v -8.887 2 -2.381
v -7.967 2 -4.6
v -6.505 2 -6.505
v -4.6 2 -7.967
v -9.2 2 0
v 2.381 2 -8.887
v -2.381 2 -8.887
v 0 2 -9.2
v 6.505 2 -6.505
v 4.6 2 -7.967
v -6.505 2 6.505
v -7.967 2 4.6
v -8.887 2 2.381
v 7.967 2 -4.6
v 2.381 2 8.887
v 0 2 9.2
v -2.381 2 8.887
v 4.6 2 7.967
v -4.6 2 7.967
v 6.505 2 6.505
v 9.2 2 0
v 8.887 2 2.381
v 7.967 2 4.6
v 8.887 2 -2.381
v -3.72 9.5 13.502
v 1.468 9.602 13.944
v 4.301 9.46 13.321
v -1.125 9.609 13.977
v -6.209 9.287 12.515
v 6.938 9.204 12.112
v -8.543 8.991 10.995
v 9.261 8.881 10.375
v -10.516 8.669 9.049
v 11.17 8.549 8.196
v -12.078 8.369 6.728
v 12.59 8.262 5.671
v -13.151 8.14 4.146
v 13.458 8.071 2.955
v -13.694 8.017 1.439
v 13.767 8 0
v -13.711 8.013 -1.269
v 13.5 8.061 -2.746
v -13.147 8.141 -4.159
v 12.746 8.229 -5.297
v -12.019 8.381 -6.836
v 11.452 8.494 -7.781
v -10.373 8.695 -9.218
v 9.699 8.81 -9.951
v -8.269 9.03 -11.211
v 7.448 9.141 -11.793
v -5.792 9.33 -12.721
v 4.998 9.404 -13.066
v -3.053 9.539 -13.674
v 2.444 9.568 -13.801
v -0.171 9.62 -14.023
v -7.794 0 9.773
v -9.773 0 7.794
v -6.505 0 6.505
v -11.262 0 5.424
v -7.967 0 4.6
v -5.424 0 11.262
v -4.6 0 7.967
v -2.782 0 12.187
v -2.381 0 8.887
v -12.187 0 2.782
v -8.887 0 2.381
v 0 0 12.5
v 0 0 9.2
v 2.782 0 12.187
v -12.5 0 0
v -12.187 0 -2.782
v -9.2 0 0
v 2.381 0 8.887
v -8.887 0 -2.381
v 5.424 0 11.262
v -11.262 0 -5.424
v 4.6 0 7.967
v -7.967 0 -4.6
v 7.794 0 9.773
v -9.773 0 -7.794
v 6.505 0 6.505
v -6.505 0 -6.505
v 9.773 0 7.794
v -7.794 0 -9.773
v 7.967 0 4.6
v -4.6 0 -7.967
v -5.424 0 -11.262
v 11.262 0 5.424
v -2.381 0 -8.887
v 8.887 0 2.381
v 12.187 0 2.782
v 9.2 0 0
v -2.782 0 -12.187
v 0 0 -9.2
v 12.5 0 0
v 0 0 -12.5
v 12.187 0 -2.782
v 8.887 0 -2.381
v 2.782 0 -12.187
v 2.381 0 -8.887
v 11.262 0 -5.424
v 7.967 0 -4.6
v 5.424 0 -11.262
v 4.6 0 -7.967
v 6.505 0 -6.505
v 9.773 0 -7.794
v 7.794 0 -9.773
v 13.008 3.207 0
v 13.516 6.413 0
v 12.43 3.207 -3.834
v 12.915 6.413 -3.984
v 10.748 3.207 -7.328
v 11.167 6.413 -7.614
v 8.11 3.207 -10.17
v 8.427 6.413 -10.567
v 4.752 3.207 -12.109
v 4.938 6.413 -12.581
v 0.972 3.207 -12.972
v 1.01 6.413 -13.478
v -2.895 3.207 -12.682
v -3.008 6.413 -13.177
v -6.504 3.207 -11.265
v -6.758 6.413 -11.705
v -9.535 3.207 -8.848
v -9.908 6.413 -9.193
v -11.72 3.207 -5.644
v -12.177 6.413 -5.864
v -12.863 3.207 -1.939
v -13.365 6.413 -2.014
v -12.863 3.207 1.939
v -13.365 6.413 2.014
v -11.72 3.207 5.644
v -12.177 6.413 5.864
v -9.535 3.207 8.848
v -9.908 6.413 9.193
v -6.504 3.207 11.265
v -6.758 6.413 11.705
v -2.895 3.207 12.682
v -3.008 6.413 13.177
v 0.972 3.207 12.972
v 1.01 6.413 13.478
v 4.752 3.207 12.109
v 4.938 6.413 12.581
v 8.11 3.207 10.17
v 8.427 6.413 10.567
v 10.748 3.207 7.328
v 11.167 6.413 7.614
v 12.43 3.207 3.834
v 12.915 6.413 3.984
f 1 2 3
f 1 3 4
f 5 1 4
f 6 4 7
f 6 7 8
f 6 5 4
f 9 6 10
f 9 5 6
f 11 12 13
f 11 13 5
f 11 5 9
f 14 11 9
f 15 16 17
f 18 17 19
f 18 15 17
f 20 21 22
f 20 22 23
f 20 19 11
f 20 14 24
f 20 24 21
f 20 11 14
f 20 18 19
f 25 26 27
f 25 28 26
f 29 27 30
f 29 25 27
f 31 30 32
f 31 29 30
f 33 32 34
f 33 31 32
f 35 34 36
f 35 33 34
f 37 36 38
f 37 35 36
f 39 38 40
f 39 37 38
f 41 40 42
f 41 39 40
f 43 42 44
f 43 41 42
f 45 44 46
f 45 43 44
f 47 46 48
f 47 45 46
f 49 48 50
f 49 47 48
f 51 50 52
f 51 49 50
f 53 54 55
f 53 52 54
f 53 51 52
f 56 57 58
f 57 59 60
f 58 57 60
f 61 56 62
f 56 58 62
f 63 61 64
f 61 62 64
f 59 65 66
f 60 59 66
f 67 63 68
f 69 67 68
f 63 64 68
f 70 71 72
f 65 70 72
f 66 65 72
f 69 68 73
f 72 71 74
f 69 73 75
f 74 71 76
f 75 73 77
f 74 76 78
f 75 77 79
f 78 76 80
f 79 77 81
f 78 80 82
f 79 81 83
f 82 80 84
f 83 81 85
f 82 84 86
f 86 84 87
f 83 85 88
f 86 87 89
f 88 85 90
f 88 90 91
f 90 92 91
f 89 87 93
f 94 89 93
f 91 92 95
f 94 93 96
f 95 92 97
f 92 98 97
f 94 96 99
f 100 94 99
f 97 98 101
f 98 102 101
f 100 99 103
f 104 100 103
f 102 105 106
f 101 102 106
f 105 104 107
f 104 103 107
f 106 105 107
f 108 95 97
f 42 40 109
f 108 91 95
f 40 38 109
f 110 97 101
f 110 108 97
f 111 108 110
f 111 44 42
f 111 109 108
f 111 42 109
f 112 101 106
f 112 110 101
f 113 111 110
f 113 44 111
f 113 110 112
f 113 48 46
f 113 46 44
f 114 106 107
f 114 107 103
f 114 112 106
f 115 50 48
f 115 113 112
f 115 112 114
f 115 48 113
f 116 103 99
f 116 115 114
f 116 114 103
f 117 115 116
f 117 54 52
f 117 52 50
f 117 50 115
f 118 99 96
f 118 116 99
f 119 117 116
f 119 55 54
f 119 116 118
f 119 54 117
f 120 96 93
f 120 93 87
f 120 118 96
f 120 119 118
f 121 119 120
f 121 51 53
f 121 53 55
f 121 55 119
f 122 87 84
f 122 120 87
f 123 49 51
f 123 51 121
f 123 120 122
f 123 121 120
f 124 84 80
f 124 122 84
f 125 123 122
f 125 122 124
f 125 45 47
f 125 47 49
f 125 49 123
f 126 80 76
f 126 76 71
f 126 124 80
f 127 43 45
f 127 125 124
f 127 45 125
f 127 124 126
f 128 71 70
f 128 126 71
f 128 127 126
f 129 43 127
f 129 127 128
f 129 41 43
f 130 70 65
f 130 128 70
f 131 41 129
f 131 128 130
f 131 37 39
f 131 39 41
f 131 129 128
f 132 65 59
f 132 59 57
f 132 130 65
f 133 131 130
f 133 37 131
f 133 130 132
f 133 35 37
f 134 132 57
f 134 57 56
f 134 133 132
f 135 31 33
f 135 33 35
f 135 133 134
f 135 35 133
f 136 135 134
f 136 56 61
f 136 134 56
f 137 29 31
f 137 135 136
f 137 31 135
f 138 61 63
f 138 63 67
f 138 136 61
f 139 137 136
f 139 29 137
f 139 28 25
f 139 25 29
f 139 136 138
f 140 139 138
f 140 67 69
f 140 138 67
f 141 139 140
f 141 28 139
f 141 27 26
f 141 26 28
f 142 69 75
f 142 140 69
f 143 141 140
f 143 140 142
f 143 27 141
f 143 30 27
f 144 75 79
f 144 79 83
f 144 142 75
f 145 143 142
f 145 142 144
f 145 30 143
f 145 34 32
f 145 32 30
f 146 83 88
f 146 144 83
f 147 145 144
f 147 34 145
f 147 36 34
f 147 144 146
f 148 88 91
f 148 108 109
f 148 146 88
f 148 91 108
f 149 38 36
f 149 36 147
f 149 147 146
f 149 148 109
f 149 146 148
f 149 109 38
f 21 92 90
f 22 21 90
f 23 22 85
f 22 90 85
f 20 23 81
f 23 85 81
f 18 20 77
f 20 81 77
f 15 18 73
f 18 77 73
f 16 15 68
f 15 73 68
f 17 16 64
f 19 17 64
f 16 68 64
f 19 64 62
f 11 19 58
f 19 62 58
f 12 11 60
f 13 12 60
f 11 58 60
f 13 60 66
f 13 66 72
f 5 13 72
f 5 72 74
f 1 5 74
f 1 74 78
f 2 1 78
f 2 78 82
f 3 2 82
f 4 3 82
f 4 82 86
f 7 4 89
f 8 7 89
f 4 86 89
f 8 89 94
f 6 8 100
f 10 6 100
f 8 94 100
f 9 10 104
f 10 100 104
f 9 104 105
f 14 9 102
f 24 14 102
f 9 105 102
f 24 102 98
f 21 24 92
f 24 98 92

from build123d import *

# Parameters (mm, degrees)
SKETCH1_R               = 12.5
BOSS_EXTRUDE1_DEPTH     = 10
BOSS_EXTRUDE1_TAPER     = -9
SKETCH2_R               = 9.2
CUT_EXTRUDE1_DEPTH      = 2
SKETCH3_R               = 61.5
CUT_EXTRUDE2_DEPTH      = 15.083844503
CUT_EXTRUDE2_DEPTH_BACK = 15.083844503


with BuildPart() as part:
    # Sketch1 → Boss-Extrude1 (new body)
    with BuildSketch(Plane(origin=(0, 0, 0), x_dir=(1, 0, 0), z_dir=(0, 1, 0))):
        Circle(SKETCH1_R)
    extrude(amount=BOSS_EXTRUDE1_DEPTH, taper=BOSS_EXTRUDE1_TAPER)

    # Sketch2 → Cut-Extrude1 (cut)
    with BuildSketch(Plane.XZ):
        Circle(SKETCH2_R)
    extrude(amount=-CUT_EXTRUDE1_DEPTH, mode=Mode.SUBTRACT)

    # Sketch3 → Cut-Extrude2 (cut, two sides)
    with BuildSketch(Plane(origin=(0, 0, 0), x_dir=(0, 0, -1), z_dir=(1, 0, 0))) as cut_extrude2_sk:
        with Locations((0, 69.5)):
            Circle(SKETCH3_R)
    extrude(amount=CUT_EXTRUDE2_DEPTH, mode=Mode.SUBTRACT)
    extrude(cut_extrude2_sk.sketch, amount=-CUT_EXTRUDE2_DEPTH_BACK, mode=Mode.SUBTRACT)


solid = part.part
